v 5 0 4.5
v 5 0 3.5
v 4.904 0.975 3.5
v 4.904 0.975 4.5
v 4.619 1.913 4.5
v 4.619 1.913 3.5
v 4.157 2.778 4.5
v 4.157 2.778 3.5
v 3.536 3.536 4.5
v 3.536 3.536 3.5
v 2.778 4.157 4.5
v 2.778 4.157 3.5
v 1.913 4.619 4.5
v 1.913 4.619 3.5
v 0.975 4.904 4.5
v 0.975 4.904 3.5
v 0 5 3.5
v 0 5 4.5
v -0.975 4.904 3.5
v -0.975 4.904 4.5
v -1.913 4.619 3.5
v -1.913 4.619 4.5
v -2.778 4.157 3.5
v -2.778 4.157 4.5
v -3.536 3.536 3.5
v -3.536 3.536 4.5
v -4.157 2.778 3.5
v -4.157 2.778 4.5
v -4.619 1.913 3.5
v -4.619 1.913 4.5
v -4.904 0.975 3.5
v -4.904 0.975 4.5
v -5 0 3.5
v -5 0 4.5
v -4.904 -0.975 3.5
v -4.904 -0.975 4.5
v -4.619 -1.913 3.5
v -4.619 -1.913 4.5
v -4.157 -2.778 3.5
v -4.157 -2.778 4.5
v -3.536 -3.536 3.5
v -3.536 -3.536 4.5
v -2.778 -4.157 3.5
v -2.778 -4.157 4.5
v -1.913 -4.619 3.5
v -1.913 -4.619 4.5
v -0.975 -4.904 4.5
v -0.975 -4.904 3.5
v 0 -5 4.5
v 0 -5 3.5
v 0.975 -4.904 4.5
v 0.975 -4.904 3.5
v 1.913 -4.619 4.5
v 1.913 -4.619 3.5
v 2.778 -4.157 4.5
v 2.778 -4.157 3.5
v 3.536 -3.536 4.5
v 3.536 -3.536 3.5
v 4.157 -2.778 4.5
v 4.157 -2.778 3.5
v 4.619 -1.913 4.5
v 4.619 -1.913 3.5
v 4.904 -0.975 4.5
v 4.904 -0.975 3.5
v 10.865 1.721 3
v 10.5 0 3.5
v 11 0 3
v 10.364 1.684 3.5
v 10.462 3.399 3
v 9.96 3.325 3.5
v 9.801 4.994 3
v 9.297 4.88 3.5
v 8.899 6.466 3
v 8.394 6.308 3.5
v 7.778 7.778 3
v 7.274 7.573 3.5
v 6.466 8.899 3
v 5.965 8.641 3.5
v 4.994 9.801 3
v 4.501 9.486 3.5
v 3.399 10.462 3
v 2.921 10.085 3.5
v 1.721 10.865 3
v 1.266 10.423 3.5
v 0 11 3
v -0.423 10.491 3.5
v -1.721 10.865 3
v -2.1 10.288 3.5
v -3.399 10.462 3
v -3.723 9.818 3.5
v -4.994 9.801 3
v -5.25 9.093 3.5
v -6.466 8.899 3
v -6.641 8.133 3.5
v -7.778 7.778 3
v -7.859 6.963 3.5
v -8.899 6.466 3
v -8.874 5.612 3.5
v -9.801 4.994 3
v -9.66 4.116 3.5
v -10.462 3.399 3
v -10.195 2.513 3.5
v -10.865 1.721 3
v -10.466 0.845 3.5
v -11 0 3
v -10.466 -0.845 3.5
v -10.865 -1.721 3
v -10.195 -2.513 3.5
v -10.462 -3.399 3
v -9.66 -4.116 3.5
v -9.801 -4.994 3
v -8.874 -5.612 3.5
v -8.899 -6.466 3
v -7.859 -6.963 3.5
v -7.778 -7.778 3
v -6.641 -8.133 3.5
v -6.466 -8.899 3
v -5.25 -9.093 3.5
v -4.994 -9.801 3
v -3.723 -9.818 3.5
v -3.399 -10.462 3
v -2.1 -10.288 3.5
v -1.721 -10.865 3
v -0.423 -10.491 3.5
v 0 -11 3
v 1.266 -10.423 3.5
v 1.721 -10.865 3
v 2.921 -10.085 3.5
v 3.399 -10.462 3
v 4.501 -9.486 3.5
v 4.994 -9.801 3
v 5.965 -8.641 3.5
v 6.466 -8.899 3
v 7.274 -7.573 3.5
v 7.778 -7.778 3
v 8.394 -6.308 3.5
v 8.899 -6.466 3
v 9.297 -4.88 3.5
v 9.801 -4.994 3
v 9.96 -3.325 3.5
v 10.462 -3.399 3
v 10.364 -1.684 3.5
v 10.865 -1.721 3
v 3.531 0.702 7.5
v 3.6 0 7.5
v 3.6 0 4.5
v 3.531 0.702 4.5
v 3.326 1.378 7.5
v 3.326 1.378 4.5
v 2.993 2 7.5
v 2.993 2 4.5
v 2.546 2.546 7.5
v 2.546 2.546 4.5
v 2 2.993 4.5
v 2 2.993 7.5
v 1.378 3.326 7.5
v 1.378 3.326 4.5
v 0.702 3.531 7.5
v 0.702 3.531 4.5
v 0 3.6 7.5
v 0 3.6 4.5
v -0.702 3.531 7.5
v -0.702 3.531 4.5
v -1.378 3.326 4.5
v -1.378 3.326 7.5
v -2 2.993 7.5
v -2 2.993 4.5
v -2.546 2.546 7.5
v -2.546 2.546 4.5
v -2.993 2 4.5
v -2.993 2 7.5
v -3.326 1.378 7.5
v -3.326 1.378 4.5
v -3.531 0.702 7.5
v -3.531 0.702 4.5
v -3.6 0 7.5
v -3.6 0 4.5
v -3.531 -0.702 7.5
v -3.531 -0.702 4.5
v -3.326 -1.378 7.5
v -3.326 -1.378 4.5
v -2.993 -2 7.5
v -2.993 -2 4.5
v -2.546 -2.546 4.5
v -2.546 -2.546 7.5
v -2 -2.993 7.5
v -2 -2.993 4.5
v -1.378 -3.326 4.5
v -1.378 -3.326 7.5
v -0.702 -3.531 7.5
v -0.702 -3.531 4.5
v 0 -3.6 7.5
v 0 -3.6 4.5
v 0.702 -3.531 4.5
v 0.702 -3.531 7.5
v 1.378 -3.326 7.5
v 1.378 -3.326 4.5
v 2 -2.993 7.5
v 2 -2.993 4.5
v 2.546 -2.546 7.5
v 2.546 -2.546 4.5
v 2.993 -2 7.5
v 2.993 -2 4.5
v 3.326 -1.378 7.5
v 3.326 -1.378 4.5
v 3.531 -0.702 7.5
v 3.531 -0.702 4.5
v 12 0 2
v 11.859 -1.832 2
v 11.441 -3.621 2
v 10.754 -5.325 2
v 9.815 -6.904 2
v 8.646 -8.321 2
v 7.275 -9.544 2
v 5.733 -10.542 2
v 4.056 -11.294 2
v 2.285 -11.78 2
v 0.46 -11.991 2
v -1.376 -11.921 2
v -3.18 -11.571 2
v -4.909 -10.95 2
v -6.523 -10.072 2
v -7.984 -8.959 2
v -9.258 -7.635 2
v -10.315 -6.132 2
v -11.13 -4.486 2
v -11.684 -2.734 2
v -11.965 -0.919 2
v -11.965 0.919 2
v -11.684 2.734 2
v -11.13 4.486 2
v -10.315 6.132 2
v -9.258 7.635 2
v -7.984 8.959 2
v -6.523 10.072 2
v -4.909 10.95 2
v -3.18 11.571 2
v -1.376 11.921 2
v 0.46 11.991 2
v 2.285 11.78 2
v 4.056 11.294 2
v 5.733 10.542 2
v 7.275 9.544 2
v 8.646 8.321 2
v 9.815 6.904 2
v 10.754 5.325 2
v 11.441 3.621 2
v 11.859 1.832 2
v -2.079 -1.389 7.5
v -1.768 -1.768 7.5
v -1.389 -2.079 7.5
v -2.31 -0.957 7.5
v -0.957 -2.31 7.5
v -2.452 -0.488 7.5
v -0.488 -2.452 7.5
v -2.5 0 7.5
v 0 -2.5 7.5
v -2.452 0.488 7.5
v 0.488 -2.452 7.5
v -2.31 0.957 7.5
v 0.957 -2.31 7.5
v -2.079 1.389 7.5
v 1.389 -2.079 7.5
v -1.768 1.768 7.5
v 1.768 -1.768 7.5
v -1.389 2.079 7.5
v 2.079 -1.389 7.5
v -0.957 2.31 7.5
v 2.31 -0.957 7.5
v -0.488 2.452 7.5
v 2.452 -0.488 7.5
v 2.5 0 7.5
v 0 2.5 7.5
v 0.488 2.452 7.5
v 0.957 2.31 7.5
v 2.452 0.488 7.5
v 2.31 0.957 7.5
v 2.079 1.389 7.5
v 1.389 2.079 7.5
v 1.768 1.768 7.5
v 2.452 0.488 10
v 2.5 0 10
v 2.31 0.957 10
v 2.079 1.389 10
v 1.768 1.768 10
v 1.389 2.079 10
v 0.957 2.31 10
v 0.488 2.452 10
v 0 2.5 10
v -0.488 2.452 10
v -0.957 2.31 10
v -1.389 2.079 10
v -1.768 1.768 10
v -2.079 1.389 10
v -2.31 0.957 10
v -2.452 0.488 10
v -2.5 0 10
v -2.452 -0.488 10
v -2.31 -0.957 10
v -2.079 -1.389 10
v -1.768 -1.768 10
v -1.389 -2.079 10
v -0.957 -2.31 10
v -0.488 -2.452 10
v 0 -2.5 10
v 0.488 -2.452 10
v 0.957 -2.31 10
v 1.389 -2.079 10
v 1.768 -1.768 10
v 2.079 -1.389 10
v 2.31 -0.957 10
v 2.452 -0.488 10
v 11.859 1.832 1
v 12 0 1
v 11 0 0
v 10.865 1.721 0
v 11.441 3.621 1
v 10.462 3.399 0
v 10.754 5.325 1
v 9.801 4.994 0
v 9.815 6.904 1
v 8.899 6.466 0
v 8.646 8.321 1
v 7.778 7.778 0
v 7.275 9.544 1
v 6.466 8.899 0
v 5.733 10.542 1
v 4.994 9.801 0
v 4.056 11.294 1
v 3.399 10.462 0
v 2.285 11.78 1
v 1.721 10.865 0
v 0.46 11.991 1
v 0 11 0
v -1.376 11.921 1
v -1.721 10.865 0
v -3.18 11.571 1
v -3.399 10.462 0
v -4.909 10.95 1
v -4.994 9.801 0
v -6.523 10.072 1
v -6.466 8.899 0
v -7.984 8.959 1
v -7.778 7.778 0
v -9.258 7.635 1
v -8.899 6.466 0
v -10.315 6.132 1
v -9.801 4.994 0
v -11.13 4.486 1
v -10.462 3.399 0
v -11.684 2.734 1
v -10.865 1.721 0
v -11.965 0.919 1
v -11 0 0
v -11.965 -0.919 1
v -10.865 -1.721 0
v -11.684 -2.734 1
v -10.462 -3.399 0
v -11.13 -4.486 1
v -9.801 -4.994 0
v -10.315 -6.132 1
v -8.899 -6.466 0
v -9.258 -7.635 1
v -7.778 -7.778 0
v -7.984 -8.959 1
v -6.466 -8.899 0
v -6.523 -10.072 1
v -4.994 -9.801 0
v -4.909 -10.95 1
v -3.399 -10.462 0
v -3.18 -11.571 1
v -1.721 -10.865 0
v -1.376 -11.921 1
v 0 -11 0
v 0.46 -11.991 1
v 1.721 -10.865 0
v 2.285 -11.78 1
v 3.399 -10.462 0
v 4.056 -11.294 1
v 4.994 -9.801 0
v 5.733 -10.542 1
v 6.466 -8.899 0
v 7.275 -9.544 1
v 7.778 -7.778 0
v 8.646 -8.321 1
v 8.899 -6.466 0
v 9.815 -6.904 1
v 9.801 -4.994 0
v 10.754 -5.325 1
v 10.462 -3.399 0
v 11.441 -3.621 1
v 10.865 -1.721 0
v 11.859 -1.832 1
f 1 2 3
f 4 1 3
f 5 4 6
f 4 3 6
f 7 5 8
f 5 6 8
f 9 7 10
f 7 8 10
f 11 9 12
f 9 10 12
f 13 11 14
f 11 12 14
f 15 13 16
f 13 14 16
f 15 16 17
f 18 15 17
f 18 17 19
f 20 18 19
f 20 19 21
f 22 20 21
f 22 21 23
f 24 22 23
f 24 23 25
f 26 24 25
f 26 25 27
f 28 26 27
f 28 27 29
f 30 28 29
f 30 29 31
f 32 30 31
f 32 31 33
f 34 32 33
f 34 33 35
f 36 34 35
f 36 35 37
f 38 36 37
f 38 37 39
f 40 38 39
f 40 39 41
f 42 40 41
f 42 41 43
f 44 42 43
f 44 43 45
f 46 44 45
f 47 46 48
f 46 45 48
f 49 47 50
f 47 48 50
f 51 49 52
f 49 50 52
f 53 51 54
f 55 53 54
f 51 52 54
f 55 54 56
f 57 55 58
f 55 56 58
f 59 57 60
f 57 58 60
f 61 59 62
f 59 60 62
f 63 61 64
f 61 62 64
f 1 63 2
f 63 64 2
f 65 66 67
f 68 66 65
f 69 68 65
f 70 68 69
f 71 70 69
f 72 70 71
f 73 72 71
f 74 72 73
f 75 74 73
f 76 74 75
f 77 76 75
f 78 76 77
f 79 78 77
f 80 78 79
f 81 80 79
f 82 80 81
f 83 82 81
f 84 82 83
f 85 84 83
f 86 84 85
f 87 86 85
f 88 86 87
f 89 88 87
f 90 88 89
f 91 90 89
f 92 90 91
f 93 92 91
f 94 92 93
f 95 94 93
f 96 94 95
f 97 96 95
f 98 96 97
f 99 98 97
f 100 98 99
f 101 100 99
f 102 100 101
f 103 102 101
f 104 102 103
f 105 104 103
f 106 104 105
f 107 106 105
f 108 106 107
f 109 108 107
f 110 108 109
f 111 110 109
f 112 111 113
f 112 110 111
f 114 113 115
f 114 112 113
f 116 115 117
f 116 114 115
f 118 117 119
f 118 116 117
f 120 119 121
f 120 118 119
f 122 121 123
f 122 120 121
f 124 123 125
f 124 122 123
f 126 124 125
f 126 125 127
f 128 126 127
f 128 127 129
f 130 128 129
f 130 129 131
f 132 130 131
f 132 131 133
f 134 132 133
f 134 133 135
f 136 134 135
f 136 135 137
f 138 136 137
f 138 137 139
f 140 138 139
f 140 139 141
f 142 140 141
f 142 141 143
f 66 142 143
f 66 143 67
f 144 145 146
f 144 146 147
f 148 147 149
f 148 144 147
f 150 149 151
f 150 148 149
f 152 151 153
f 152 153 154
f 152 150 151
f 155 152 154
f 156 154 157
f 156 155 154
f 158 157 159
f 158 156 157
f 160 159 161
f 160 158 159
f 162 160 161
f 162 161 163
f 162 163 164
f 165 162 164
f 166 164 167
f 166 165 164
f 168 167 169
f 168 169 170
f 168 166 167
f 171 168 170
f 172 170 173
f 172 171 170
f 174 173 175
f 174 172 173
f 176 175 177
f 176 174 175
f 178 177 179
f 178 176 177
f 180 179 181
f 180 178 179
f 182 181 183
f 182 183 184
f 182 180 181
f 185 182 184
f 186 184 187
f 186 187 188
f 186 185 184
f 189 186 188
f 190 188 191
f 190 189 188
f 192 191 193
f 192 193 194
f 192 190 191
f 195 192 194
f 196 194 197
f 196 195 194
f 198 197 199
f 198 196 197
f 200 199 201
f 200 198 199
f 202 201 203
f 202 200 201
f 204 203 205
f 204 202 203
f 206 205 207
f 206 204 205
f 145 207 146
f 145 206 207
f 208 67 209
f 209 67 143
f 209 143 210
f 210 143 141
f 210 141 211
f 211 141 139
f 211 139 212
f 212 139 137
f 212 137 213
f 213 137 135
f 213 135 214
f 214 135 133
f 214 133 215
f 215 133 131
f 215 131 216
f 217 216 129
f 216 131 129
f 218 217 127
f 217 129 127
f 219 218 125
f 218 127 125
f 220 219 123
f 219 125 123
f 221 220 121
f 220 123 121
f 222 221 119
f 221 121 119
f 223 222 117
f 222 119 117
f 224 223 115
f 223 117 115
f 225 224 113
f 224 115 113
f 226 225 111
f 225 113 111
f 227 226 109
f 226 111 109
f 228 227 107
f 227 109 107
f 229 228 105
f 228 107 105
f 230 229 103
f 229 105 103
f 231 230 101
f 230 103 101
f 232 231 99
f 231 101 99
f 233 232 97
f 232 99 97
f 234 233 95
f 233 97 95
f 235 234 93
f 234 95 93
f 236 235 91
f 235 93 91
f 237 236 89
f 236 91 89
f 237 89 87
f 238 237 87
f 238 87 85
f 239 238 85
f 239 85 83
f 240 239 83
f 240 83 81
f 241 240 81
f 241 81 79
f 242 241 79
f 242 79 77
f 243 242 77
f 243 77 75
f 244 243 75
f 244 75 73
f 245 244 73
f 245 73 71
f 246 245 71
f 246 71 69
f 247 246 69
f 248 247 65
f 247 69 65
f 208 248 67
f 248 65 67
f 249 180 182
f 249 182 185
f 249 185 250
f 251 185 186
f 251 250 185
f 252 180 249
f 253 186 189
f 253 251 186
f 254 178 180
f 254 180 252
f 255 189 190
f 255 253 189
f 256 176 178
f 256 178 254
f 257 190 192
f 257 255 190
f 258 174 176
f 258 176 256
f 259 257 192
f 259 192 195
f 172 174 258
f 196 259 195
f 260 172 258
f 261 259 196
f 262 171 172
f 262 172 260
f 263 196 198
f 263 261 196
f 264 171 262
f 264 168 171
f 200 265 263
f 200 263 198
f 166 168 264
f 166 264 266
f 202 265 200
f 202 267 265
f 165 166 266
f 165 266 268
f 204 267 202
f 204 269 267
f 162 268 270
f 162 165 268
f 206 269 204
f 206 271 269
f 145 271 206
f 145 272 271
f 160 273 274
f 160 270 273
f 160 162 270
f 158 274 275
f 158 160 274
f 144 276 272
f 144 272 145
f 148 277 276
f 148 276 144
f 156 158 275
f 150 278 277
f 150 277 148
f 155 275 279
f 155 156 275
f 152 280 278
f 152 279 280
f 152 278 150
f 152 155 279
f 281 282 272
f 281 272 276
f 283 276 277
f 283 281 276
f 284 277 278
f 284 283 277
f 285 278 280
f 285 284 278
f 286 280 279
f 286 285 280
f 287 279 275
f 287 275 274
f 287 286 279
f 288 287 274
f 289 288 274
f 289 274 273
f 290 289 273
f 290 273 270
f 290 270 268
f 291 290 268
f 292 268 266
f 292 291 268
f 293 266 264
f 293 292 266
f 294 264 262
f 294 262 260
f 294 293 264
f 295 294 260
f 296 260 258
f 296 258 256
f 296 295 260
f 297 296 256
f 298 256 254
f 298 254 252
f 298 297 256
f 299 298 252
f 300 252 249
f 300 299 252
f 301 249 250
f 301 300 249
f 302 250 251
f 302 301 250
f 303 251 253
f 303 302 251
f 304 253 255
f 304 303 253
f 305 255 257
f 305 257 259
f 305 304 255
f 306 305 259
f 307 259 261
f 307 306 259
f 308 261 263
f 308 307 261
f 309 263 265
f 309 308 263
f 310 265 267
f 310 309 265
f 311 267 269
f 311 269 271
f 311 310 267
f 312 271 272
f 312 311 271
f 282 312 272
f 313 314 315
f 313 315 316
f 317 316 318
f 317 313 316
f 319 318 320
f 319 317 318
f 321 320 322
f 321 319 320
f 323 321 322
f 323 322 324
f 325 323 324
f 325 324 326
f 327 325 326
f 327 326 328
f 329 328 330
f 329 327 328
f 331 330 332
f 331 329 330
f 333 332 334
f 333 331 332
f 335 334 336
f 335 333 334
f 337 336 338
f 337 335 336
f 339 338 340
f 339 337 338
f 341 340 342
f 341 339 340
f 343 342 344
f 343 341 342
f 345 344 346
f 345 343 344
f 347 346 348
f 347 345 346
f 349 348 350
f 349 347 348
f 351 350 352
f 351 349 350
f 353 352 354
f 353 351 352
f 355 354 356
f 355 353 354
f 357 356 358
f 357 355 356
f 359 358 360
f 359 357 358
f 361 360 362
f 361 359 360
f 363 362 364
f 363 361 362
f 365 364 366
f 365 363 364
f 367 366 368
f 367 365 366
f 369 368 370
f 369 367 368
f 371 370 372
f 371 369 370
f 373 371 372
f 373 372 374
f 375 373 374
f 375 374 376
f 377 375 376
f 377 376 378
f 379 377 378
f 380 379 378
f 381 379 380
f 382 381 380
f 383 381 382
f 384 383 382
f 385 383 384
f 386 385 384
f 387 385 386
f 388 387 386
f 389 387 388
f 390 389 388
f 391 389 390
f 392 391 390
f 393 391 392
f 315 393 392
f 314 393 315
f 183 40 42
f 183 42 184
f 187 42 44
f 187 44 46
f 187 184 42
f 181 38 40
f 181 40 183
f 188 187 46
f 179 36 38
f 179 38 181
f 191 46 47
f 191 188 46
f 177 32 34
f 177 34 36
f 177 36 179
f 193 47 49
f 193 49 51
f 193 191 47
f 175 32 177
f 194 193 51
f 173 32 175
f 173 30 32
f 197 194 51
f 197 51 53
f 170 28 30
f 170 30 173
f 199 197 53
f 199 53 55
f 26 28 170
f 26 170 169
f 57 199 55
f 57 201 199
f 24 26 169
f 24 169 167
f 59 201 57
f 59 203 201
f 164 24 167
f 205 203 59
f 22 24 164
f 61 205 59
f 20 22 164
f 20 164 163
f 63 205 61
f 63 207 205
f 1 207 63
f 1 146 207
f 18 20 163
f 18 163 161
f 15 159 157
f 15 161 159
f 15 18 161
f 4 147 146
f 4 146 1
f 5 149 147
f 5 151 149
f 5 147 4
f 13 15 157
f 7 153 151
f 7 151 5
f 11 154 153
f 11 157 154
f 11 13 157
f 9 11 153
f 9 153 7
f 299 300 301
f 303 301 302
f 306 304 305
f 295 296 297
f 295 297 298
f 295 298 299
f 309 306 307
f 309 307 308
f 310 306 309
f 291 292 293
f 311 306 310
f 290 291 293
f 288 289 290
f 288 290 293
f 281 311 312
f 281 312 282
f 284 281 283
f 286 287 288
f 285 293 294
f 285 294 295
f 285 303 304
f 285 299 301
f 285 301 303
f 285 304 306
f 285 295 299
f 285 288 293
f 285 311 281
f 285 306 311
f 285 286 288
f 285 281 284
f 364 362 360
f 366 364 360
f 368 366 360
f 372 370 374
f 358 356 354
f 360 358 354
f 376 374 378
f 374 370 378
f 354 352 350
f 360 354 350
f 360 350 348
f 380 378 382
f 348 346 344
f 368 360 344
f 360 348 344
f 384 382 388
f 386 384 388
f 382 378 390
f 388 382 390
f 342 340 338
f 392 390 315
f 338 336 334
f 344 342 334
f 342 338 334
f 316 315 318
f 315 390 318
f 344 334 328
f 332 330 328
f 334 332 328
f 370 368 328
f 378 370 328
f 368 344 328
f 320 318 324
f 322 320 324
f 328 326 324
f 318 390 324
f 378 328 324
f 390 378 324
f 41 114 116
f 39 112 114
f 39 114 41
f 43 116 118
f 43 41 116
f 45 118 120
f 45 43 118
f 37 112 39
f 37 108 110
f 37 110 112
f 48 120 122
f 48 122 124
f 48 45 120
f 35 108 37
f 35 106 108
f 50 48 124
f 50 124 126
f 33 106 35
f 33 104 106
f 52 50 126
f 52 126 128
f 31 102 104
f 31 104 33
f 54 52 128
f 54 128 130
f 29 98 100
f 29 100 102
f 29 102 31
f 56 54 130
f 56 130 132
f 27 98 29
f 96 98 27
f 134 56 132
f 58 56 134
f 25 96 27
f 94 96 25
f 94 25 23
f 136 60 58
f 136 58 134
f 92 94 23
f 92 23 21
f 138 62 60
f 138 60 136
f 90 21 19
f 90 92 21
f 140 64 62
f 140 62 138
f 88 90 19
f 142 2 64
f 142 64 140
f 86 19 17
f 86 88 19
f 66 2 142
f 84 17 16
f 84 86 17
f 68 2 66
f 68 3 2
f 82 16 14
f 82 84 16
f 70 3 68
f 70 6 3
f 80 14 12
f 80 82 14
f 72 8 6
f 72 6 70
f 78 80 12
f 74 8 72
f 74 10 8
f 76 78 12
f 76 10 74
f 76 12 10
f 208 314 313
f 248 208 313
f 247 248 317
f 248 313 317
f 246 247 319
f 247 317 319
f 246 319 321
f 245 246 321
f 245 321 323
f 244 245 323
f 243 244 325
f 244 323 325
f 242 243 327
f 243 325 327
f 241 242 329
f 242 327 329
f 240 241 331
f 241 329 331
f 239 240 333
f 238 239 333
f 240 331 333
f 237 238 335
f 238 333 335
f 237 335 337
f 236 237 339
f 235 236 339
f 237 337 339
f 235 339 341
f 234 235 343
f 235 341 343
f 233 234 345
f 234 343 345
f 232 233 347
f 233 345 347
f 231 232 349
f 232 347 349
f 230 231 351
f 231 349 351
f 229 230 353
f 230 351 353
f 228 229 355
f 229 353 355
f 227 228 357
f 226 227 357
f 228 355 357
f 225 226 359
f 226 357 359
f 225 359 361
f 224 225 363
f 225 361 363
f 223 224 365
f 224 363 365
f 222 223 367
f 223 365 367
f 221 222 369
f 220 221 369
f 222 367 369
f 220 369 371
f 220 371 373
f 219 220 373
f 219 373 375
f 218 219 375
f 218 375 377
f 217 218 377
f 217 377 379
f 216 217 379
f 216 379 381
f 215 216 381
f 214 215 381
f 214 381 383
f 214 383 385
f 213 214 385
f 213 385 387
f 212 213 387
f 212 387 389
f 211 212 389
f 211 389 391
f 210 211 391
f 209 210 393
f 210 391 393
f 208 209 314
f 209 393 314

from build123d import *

# Parameters (mm, degrees)
F0_R      = 12
F0_R_2    = 11
F0_R_3    = 5
F0_R_4    = 4.1
F0_R_5    = 3
F1_DEPTH  = 2
F2_DEPTH  = 3.5
F3_SIZE   = 0.99999
F4_DEPTH  = 4.5
F5_DEPTH  = 7.5
F6_DEPTH  = 10
F7_SIZE   = 1
F8_SIZE   = 0.5
F9_R      = 3
F9_R_2    = 2.5
F10_DEPTH = 2.5
F11_R     = 4.1
F11_R_2   = 3.6
F12_DEPTH = 3


# Not quite as in the source:
# - a fillet or chamfer is up to 0.001 mm smaller than in the source, because OpenCascade refuses the exact size


with BuildPart() as f1:
    # F0 (on Top) → F1 (new body)
    with BuildSketch(Plane.XY):
        Circle(F0_R)
        Circle(F0_R_2, mode=Mode.SUBTRACT)
        Circle(F0_R_2)
        Circle(F0_R_3, mode=Mode.SUBTRACT)
        Circle(F0_R_3)
        Circle(F0_R_4, mode=Mode.SUBTRACT)
        Circle(F0_R_4)
        Circle(F0_R_5, mode=Mode.SUBTRACT)
        Circle(F0_R_5)
    extrude(amount=F1_DEPTH)

    # F0 (on Top) → F2 (join)
    with BuildSketch(Plane.XY):
        Circle(F0_R_2)
        Circle(F0_R_3, mode=Mode.SUBTRACT)
        Circle(F0_R_3)
        Circle(F0_R_4, mode=Mode.SUBTRACT)
        Circle(F0_R_4)
        Circle(F0_R_5, mode=Mode.SUBTRACT)
        Circle(F0_R_5)
    extrude(amount=F2_DEPTH)

    # F3 (size 1 in the source; OpenCascade refuses exactly that, so slightly less here)
    f3_edges = [f1.edges().sort_by_distance(p)[0] for p in [
        (-11, 0, 2),
    ]]
    chamfer(f3_edges, length=F3_SIZE)

    # F0 (on Top) → F4 (join)
    with BuildSketch(Plane.XY):
        Circle(F0_R_3)
        Circle(F0_R_4, mode=Mode.SUBTRACT)
        Circle(F0_R_4)
        Circle(F0_R_5, mode=Mode.SUBTRACT)
        Circle(F0_R_5)
    extrude(amount=F4_DEPTH)

    # F0 (on Top) → F5 (join)
    with BuildSketch(Plane.XY):
        Circle(F0_R_4)
        Circle(F0_R_5, mode=Mode.SUBTRACT)
    extrude(amount=F5_DEPTH)

    # F0 (on Top) → F6 (join)
    with BuildSketch(Plane.XY):
        Circle(F0_R_5)
    extrude(amount=F6_DEPTH)

    # F7
    f7_edges = [f1.edges().sort_by_distance(p)[0] for p in [
        (-12, 0, 0),
    ]]
    chamfer(f7_edges, length=F7_SIZE)

    # F8
    f8_edges = [f1.edges().sort_by_distance(p)[0] for p in [
        (-11, 0, 3.5),
    ]]
    chamfer(f8_edges, length=F8_SIZE)

    # F9 (on face) → F10 (cut, through all)
    with BuildSketch(Plane.XY.offset(10)):
        Circle(F9_R)
        Circle(F9_R_2, mode=Mode.SUBTRACT)
    extrude(amount=-F10_DEPTH, mode=Mode.SUBTRACT)

    # F11 (on face) → F12 (cut, through all)
    with BuildSketch(Plane.XY.offset(7.5)):
        Circle(F11_R)
        Circle(F11_R_2, mode=Mode.SUBTRACT)
    extrude(amount=-F12_DEPTH, mode=Mode.SUBTRACT)


solid = f1.part
